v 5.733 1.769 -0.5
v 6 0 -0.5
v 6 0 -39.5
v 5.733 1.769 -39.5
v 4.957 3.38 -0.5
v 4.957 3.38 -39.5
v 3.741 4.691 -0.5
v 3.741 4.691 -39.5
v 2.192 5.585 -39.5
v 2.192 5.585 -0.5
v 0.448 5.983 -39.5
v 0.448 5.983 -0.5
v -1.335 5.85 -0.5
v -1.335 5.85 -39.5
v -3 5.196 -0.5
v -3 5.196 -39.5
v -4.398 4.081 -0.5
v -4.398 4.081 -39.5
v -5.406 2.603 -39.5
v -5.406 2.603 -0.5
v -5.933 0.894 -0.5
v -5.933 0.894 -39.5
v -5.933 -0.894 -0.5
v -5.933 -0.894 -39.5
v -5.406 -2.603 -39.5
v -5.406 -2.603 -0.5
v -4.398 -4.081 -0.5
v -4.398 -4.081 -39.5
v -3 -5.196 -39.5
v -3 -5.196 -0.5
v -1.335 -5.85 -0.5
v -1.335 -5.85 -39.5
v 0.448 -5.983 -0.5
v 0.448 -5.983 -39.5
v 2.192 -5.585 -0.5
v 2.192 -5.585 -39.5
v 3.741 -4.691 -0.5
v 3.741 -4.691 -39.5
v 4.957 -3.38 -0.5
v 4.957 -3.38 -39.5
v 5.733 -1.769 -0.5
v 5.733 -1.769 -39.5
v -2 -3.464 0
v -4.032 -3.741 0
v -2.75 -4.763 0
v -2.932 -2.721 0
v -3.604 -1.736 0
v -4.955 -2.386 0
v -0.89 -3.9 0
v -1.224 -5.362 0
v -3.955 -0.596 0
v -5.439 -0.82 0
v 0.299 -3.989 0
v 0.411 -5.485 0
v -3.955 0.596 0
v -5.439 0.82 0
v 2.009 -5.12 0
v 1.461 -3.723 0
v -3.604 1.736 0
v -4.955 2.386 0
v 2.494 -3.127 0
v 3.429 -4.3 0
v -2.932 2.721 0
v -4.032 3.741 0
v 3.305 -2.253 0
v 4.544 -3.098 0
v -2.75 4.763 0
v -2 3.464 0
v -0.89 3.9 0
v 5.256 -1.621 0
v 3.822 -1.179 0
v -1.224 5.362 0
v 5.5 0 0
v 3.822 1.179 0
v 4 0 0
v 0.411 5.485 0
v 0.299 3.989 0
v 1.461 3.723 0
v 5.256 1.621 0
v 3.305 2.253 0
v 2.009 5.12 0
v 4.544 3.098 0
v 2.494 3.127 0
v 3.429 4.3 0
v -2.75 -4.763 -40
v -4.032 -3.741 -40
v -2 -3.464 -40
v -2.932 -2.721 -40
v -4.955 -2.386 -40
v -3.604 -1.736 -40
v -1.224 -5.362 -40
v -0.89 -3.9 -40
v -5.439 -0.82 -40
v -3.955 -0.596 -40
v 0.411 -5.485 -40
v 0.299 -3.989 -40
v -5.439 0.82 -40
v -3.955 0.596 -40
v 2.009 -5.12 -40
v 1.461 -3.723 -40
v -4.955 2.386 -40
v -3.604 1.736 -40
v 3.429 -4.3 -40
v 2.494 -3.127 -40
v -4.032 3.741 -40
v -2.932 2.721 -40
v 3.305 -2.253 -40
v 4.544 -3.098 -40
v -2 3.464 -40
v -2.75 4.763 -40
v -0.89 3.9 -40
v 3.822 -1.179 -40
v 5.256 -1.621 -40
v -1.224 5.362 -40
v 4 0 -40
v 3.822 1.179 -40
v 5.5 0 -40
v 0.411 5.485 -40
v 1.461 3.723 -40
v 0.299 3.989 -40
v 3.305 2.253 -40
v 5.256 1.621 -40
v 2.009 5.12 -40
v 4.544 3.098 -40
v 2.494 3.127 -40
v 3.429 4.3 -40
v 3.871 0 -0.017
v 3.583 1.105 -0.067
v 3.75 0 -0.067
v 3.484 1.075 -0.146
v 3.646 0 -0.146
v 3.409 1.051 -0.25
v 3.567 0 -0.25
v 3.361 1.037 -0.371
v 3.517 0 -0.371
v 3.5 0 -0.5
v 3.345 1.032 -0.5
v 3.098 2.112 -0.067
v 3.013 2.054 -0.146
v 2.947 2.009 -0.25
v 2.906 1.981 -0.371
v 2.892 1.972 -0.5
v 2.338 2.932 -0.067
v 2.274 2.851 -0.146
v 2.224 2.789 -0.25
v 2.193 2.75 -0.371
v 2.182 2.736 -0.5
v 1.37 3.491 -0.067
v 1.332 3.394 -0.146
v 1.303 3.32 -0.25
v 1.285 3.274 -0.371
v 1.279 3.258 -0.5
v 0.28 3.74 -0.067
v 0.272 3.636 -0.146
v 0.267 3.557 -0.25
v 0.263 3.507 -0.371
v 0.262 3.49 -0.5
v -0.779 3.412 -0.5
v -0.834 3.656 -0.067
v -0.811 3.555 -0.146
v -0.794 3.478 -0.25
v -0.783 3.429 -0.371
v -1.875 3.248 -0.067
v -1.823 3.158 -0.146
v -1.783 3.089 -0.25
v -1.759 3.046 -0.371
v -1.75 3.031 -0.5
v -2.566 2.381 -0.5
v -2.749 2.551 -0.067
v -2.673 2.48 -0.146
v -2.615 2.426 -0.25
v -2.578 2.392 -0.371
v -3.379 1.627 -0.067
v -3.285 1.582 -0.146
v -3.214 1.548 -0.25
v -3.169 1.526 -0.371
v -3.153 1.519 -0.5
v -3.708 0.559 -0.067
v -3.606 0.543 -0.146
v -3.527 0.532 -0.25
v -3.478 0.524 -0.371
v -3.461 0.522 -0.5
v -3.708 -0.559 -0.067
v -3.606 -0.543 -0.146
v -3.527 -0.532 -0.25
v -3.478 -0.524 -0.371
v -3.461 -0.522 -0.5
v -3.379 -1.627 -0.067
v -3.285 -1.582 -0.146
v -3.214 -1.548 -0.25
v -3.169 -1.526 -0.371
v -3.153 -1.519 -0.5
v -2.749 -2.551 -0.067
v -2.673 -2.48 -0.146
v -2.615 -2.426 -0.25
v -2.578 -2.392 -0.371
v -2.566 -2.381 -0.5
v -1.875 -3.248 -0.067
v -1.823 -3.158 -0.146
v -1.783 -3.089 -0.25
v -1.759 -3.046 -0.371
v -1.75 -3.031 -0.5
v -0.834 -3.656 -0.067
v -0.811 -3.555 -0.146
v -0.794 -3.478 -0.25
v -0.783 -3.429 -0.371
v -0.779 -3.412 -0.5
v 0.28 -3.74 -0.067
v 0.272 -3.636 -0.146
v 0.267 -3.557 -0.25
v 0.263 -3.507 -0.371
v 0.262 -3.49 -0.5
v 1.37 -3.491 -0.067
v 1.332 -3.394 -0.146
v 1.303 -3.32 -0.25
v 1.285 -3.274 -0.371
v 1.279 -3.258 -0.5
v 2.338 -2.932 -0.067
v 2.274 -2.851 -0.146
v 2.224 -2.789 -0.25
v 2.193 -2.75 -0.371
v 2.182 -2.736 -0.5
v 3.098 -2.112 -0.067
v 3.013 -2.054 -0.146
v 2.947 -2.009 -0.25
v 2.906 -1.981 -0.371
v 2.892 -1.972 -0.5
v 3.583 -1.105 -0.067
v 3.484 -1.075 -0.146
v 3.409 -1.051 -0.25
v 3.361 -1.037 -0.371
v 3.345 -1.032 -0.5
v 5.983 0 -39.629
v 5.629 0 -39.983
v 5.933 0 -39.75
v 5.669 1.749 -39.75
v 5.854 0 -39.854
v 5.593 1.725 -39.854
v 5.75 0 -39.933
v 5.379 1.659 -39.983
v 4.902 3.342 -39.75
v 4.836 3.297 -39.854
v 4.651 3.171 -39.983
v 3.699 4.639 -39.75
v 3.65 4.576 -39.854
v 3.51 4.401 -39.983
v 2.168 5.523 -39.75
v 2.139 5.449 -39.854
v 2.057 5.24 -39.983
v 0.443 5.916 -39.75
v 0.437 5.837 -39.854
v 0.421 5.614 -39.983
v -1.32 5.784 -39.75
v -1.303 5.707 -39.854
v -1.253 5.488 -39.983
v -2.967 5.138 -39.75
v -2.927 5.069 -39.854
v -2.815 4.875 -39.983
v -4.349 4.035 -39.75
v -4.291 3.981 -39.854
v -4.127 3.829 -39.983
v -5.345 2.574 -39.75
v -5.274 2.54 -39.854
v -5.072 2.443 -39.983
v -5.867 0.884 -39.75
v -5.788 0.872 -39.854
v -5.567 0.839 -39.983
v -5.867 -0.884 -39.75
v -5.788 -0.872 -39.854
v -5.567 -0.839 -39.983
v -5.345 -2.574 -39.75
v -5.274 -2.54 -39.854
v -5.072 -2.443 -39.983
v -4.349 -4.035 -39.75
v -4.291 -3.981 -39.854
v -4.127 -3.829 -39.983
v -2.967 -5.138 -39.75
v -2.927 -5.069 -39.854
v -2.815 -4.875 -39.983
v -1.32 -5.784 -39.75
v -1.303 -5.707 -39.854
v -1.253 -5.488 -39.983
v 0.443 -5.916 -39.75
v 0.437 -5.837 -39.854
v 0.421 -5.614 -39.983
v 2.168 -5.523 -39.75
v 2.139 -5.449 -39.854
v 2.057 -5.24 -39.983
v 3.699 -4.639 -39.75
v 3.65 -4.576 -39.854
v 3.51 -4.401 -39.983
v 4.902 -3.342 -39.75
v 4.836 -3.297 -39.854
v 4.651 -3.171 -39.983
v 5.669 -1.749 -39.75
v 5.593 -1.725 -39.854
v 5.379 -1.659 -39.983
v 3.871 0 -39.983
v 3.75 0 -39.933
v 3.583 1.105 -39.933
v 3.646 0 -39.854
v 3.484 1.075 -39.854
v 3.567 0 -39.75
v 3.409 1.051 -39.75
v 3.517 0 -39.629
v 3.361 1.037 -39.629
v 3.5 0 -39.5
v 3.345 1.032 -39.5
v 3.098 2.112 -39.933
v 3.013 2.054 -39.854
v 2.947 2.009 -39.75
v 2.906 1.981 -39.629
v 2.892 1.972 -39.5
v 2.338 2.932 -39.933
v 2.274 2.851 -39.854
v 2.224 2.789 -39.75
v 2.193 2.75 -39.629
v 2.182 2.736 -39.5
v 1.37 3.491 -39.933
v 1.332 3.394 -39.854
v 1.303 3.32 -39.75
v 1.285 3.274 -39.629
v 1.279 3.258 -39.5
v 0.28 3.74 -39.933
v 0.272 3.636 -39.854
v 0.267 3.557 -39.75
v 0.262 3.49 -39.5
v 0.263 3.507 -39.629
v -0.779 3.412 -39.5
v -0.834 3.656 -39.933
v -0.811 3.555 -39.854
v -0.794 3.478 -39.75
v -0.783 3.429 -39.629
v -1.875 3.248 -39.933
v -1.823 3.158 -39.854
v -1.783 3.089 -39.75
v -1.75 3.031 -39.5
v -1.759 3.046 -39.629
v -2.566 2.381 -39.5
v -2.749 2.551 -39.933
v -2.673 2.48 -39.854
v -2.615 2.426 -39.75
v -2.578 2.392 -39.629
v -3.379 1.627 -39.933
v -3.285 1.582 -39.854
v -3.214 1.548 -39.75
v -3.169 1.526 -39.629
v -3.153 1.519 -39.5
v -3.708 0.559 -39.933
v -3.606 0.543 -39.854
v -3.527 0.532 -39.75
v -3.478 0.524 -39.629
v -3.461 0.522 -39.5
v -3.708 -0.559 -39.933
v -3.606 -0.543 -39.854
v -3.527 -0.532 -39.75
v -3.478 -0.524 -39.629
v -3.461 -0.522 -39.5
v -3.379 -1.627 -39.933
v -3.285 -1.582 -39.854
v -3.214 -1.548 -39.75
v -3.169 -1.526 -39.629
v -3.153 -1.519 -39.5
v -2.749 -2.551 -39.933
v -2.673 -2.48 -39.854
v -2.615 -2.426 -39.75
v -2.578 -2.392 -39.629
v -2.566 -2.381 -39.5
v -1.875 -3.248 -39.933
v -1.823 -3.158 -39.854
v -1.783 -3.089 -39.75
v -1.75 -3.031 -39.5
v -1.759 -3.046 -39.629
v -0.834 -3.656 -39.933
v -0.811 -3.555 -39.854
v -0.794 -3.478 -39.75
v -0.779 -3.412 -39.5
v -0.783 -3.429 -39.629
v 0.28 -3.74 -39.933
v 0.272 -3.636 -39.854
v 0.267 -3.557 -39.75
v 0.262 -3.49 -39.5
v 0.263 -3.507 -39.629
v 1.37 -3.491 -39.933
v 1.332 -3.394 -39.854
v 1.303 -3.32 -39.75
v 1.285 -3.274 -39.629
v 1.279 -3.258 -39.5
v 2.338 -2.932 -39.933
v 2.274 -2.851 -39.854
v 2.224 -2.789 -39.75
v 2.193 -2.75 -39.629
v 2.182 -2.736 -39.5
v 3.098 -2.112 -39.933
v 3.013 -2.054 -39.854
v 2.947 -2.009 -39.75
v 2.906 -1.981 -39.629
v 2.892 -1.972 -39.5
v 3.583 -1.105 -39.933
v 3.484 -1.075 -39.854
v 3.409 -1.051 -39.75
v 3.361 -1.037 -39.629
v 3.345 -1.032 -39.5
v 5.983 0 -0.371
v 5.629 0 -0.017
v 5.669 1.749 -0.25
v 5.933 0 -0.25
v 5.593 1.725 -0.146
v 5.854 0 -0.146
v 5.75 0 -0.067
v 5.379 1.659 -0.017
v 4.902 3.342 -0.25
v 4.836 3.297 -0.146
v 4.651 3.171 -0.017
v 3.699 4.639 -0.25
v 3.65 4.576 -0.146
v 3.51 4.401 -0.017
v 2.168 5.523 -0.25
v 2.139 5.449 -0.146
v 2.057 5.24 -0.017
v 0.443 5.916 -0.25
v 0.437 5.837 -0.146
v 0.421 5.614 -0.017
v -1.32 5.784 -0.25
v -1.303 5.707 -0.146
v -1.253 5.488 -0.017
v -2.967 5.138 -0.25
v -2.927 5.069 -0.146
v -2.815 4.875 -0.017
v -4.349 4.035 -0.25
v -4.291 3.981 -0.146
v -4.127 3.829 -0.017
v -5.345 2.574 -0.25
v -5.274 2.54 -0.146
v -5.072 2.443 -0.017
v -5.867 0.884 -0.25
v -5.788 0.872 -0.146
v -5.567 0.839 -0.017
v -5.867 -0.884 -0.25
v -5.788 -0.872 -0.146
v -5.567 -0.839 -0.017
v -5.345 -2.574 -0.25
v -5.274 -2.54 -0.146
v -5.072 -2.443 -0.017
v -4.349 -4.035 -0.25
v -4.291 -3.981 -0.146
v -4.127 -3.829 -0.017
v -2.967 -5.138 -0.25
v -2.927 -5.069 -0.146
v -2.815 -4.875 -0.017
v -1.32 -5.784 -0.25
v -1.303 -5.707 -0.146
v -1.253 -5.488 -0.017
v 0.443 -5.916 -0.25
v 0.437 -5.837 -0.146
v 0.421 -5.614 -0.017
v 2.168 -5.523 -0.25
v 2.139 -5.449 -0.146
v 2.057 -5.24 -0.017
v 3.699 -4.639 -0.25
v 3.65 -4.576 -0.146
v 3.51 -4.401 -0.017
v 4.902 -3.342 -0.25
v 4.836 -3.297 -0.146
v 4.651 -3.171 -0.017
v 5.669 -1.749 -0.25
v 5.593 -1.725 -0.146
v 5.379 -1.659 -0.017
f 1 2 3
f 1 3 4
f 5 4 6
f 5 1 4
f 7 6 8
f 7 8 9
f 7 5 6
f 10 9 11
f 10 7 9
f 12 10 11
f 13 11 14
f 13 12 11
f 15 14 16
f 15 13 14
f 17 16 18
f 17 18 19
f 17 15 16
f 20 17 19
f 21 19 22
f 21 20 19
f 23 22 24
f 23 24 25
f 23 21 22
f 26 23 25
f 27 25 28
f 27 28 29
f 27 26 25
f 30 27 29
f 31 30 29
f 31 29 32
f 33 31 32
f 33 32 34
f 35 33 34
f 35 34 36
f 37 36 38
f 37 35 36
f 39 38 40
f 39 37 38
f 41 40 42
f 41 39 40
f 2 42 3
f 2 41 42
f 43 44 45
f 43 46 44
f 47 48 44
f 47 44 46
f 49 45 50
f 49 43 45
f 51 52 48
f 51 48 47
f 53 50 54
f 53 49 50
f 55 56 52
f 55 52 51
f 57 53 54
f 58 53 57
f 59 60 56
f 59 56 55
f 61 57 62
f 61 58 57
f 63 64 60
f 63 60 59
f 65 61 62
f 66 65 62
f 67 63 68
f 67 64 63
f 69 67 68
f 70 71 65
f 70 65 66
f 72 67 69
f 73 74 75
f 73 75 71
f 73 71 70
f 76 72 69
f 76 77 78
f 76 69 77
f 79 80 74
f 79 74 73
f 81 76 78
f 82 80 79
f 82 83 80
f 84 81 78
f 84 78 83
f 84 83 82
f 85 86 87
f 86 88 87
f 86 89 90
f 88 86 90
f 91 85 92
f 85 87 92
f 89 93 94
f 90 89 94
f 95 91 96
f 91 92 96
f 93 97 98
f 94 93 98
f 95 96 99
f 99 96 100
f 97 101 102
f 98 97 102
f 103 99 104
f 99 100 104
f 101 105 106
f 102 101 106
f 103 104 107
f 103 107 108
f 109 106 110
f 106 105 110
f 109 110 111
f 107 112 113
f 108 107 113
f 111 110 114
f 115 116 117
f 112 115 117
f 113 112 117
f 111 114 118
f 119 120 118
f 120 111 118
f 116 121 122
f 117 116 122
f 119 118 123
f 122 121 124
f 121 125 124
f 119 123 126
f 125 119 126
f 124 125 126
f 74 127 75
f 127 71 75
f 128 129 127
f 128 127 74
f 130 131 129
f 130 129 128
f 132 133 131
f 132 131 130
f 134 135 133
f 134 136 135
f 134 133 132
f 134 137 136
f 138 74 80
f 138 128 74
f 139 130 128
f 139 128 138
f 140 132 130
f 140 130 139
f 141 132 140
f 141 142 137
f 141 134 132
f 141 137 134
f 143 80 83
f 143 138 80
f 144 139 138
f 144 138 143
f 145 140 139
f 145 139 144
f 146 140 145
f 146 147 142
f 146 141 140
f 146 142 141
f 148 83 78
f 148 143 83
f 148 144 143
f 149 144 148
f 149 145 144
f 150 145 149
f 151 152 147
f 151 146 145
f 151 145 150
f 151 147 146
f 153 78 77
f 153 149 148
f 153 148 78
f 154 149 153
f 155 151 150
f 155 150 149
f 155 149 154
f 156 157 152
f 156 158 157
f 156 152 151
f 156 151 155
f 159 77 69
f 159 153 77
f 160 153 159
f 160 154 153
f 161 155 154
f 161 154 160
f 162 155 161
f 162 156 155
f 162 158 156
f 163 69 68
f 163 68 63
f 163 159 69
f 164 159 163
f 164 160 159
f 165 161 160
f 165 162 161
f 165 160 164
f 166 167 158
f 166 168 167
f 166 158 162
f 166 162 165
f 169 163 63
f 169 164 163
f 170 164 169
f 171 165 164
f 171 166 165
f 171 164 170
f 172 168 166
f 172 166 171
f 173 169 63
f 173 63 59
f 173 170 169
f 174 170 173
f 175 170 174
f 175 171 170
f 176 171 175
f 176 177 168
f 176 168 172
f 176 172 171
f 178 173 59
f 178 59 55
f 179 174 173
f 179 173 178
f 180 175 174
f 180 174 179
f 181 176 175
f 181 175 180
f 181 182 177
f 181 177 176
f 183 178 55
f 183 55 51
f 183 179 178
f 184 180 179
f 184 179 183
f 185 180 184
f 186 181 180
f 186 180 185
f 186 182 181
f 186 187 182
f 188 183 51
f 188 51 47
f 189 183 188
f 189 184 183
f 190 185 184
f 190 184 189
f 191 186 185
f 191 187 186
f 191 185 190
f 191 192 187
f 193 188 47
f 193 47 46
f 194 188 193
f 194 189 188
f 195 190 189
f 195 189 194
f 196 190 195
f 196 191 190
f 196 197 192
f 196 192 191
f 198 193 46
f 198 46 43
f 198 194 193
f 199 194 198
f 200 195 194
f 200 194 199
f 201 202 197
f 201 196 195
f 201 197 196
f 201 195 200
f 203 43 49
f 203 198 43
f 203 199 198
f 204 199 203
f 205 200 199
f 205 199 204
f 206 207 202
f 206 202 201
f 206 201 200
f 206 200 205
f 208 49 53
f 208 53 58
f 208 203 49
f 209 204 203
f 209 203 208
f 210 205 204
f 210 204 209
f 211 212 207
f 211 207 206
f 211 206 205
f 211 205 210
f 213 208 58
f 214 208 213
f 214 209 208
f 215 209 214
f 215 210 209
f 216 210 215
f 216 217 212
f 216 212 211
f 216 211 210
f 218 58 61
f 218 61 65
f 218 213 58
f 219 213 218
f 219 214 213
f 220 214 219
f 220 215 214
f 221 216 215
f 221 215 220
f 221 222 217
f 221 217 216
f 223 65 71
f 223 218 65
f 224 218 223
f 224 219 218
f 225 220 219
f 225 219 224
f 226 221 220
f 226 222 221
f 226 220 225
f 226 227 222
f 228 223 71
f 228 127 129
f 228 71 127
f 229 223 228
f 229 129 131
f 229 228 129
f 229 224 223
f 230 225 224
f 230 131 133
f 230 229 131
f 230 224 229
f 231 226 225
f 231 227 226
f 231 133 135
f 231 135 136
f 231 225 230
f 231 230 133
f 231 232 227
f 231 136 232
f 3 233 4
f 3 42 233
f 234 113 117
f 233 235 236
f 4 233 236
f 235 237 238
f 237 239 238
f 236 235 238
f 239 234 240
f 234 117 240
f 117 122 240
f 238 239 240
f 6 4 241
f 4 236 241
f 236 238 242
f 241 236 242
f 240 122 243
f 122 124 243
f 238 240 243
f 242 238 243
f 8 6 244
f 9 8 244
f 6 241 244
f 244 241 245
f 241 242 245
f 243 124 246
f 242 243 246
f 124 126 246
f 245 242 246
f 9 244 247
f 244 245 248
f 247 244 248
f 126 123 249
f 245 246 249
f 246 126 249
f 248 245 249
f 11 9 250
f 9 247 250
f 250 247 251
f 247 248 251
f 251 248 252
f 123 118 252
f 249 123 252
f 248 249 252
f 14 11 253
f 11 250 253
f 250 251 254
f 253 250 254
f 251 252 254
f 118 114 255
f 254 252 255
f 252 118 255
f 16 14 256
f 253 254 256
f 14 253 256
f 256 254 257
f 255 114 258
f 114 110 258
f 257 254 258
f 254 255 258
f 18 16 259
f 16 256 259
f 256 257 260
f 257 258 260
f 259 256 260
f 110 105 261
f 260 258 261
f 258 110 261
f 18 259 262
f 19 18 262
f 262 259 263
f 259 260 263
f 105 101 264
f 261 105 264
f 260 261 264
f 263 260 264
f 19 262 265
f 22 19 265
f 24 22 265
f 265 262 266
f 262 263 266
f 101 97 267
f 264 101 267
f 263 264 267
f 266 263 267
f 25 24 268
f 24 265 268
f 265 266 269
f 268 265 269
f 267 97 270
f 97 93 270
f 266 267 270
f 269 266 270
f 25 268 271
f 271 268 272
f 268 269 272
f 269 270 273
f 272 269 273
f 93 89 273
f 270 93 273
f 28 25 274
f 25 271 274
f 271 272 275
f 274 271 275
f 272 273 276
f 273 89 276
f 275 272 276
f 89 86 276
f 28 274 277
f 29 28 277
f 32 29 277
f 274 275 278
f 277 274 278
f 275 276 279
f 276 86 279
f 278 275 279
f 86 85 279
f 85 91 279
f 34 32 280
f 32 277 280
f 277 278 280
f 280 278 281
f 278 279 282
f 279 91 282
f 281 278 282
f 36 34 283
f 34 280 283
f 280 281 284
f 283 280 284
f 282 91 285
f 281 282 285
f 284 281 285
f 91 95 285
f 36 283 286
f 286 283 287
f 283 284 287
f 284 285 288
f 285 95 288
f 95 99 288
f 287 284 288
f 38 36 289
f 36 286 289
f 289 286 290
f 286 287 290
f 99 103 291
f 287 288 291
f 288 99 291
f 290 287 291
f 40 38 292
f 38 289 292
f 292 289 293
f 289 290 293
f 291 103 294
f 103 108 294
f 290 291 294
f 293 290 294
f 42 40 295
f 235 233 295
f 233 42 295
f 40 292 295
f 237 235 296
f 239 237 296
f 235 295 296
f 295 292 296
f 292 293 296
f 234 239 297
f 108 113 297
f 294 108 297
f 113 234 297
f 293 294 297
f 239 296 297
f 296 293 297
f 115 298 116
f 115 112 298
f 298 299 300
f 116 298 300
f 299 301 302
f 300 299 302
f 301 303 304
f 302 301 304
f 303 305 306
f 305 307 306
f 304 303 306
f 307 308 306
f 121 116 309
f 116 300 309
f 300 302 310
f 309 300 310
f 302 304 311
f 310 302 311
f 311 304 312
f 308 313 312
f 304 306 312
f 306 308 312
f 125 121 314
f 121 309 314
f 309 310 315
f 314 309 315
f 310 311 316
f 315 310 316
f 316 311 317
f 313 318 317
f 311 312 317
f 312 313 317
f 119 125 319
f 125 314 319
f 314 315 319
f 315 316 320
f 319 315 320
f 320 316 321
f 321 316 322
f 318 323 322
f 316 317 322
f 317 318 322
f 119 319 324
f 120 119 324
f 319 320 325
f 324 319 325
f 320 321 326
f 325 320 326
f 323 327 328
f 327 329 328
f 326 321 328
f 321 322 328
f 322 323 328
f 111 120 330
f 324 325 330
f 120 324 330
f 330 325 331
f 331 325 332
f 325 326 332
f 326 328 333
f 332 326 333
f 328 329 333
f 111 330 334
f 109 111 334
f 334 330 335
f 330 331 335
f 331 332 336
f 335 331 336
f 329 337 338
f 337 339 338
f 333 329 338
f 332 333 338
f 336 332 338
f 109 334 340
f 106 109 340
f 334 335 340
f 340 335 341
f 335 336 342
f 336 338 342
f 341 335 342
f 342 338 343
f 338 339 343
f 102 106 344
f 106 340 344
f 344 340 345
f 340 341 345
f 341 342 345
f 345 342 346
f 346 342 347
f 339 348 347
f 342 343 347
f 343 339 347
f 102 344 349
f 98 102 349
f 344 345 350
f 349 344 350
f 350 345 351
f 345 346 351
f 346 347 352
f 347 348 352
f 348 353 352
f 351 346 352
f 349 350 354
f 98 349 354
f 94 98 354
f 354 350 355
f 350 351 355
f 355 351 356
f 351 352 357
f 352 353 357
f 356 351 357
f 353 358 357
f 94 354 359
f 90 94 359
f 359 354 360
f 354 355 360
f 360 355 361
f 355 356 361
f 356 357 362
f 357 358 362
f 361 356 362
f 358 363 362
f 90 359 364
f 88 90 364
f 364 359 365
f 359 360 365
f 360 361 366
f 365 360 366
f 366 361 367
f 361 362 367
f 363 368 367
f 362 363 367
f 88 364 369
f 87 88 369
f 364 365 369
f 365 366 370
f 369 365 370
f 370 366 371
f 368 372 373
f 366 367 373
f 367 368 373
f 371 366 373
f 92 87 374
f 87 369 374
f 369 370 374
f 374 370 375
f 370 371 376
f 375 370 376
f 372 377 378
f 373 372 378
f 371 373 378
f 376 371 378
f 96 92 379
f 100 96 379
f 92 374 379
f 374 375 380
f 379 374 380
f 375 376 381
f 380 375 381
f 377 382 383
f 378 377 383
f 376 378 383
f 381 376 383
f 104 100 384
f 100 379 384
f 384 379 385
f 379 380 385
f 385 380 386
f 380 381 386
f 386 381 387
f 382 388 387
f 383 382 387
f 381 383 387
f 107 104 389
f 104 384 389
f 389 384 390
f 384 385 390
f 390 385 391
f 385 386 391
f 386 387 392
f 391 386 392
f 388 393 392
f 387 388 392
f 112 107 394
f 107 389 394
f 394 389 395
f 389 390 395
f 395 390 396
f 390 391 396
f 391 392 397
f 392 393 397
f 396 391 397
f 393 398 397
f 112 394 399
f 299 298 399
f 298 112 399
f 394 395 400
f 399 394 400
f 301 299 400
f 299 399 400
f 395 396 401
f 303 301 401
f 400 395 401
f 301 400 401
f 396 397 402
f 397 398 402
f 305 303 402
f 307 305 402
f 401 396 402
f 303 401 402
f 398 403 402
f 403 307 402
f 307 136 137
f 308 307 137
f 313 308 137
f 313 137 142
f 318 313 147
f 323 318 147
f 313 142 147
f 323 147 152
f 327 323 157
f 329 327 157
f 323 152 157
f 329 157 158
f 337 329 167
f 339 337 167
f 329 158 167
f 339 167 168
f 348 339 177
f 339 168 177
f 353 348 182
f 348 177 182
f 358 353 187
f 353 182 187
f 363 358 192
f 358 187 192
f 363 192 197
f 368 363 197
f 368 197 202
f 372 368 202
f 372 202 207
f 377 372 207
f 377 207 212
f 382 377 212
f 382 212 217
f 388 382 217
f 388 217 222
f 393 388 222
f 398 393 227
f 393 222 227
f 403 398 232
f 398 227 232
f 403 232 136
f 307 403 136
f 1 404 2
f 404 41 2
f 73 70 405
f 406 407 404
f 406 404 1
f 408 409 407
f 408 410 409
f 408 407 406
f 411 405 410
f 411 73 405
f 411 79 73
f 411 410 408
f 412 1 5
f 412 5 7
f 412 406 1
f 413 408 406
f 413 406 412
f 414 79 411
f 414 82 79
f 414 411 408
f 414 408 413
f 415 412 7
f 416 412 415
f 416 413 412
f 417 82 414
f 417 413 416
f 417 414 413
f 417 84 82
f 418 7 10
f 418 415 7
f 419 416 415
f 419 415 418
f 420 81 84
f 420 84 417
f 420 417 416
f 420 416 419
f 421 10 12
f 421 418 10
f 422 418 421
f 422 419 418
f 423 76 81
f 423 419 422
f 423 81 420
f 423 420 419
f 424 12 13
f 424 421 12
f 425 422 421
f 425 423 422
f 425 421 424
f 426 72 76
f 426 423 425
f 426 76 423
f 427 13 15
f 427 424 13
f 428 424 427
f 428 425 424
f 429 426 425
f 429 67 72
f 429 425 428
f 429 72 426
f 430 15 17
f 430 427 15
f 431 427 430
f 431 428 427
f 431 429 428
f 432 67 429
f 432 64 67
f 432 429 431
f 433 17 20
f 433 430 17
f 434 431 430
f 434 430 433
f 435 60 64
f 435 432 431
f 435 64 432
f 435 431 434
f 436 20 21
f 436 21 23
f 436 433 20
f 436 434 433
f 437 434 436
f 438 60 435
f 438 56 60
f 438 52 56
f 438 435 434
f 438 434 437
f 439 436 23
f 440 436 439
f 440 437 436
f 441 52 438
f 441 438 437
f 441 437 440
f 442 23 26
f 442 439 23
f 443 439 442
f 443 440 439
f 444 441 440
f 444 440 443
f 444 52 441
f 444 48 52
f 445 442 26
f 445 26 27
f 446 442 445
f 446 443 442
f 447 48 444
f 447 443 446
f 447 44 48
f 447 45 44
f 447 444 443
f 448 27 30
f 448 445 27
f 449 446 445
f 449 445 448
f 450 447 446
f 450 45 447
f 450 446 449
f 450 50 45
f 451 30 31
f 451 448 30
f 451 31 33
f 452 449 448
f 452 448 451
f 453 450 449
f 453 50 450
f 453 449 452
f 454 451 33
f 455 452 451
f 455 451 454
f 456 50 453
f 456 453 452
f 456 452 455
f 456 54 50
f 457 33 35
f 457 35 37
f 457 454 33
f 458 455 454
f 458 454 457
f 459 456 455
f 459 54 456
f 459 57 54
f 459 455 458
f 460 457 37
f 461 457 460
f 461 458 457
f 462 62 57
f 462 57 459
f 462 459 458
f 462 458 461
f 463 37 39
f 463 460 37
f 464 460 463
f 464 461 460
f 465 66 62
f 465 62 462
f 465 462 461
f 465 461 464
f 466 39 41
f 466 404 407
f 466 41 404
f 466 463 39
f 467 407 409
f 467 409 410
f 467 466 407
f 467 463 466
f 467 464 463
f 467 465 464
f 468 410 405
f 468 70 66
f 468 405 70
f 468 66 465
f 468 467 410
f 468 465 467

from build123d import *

# Parameters (mm, degrees)
SZKIC1_R                    = 6
SZKIC1_R_2                  = 3.5
DODANIE_WYCI_GNI_CIE1_DEPTH = 40
ZAOKR_GLENIE1_R             = 0.5
ZAOKR_GLENIE2_R             = 0.5


with BuildPart() as part:
    # Szkic1 → Dodanie-wyciągnięcie1 (new body)
    with BuildSketch(Plane.XY):
        Circle(SZKIC1_R)
        Circle(SZKIC1_R_2, mode=Mode.SUBTRACT)
    extrude(amount=-DODANIE_WYCI_GNI_CIE1_DEPTH)

    # Zaokrąglenie1
    zaokr_glenie1_edges = [part.edges().sort_by_distance(p)[0] for p in [
        (-6, 0, 0),
        (-6, 0, -40),
    ]]
    fillet(zaokr_glenie1_edges, radius=ZAOKR_GLENIE1_R)

    # Zaokrąglenie2
    zaokr_glenie2_edges = [part.edges().sort_by_distance(p)[0] for p in [
        (-3.5, 0, -40),
        (-3.5, 0, 0),
    ]]
    fillet(zaokr_glenie2_edges, radius=ZAOKR_GLENIE2_R)


solid = part.part
